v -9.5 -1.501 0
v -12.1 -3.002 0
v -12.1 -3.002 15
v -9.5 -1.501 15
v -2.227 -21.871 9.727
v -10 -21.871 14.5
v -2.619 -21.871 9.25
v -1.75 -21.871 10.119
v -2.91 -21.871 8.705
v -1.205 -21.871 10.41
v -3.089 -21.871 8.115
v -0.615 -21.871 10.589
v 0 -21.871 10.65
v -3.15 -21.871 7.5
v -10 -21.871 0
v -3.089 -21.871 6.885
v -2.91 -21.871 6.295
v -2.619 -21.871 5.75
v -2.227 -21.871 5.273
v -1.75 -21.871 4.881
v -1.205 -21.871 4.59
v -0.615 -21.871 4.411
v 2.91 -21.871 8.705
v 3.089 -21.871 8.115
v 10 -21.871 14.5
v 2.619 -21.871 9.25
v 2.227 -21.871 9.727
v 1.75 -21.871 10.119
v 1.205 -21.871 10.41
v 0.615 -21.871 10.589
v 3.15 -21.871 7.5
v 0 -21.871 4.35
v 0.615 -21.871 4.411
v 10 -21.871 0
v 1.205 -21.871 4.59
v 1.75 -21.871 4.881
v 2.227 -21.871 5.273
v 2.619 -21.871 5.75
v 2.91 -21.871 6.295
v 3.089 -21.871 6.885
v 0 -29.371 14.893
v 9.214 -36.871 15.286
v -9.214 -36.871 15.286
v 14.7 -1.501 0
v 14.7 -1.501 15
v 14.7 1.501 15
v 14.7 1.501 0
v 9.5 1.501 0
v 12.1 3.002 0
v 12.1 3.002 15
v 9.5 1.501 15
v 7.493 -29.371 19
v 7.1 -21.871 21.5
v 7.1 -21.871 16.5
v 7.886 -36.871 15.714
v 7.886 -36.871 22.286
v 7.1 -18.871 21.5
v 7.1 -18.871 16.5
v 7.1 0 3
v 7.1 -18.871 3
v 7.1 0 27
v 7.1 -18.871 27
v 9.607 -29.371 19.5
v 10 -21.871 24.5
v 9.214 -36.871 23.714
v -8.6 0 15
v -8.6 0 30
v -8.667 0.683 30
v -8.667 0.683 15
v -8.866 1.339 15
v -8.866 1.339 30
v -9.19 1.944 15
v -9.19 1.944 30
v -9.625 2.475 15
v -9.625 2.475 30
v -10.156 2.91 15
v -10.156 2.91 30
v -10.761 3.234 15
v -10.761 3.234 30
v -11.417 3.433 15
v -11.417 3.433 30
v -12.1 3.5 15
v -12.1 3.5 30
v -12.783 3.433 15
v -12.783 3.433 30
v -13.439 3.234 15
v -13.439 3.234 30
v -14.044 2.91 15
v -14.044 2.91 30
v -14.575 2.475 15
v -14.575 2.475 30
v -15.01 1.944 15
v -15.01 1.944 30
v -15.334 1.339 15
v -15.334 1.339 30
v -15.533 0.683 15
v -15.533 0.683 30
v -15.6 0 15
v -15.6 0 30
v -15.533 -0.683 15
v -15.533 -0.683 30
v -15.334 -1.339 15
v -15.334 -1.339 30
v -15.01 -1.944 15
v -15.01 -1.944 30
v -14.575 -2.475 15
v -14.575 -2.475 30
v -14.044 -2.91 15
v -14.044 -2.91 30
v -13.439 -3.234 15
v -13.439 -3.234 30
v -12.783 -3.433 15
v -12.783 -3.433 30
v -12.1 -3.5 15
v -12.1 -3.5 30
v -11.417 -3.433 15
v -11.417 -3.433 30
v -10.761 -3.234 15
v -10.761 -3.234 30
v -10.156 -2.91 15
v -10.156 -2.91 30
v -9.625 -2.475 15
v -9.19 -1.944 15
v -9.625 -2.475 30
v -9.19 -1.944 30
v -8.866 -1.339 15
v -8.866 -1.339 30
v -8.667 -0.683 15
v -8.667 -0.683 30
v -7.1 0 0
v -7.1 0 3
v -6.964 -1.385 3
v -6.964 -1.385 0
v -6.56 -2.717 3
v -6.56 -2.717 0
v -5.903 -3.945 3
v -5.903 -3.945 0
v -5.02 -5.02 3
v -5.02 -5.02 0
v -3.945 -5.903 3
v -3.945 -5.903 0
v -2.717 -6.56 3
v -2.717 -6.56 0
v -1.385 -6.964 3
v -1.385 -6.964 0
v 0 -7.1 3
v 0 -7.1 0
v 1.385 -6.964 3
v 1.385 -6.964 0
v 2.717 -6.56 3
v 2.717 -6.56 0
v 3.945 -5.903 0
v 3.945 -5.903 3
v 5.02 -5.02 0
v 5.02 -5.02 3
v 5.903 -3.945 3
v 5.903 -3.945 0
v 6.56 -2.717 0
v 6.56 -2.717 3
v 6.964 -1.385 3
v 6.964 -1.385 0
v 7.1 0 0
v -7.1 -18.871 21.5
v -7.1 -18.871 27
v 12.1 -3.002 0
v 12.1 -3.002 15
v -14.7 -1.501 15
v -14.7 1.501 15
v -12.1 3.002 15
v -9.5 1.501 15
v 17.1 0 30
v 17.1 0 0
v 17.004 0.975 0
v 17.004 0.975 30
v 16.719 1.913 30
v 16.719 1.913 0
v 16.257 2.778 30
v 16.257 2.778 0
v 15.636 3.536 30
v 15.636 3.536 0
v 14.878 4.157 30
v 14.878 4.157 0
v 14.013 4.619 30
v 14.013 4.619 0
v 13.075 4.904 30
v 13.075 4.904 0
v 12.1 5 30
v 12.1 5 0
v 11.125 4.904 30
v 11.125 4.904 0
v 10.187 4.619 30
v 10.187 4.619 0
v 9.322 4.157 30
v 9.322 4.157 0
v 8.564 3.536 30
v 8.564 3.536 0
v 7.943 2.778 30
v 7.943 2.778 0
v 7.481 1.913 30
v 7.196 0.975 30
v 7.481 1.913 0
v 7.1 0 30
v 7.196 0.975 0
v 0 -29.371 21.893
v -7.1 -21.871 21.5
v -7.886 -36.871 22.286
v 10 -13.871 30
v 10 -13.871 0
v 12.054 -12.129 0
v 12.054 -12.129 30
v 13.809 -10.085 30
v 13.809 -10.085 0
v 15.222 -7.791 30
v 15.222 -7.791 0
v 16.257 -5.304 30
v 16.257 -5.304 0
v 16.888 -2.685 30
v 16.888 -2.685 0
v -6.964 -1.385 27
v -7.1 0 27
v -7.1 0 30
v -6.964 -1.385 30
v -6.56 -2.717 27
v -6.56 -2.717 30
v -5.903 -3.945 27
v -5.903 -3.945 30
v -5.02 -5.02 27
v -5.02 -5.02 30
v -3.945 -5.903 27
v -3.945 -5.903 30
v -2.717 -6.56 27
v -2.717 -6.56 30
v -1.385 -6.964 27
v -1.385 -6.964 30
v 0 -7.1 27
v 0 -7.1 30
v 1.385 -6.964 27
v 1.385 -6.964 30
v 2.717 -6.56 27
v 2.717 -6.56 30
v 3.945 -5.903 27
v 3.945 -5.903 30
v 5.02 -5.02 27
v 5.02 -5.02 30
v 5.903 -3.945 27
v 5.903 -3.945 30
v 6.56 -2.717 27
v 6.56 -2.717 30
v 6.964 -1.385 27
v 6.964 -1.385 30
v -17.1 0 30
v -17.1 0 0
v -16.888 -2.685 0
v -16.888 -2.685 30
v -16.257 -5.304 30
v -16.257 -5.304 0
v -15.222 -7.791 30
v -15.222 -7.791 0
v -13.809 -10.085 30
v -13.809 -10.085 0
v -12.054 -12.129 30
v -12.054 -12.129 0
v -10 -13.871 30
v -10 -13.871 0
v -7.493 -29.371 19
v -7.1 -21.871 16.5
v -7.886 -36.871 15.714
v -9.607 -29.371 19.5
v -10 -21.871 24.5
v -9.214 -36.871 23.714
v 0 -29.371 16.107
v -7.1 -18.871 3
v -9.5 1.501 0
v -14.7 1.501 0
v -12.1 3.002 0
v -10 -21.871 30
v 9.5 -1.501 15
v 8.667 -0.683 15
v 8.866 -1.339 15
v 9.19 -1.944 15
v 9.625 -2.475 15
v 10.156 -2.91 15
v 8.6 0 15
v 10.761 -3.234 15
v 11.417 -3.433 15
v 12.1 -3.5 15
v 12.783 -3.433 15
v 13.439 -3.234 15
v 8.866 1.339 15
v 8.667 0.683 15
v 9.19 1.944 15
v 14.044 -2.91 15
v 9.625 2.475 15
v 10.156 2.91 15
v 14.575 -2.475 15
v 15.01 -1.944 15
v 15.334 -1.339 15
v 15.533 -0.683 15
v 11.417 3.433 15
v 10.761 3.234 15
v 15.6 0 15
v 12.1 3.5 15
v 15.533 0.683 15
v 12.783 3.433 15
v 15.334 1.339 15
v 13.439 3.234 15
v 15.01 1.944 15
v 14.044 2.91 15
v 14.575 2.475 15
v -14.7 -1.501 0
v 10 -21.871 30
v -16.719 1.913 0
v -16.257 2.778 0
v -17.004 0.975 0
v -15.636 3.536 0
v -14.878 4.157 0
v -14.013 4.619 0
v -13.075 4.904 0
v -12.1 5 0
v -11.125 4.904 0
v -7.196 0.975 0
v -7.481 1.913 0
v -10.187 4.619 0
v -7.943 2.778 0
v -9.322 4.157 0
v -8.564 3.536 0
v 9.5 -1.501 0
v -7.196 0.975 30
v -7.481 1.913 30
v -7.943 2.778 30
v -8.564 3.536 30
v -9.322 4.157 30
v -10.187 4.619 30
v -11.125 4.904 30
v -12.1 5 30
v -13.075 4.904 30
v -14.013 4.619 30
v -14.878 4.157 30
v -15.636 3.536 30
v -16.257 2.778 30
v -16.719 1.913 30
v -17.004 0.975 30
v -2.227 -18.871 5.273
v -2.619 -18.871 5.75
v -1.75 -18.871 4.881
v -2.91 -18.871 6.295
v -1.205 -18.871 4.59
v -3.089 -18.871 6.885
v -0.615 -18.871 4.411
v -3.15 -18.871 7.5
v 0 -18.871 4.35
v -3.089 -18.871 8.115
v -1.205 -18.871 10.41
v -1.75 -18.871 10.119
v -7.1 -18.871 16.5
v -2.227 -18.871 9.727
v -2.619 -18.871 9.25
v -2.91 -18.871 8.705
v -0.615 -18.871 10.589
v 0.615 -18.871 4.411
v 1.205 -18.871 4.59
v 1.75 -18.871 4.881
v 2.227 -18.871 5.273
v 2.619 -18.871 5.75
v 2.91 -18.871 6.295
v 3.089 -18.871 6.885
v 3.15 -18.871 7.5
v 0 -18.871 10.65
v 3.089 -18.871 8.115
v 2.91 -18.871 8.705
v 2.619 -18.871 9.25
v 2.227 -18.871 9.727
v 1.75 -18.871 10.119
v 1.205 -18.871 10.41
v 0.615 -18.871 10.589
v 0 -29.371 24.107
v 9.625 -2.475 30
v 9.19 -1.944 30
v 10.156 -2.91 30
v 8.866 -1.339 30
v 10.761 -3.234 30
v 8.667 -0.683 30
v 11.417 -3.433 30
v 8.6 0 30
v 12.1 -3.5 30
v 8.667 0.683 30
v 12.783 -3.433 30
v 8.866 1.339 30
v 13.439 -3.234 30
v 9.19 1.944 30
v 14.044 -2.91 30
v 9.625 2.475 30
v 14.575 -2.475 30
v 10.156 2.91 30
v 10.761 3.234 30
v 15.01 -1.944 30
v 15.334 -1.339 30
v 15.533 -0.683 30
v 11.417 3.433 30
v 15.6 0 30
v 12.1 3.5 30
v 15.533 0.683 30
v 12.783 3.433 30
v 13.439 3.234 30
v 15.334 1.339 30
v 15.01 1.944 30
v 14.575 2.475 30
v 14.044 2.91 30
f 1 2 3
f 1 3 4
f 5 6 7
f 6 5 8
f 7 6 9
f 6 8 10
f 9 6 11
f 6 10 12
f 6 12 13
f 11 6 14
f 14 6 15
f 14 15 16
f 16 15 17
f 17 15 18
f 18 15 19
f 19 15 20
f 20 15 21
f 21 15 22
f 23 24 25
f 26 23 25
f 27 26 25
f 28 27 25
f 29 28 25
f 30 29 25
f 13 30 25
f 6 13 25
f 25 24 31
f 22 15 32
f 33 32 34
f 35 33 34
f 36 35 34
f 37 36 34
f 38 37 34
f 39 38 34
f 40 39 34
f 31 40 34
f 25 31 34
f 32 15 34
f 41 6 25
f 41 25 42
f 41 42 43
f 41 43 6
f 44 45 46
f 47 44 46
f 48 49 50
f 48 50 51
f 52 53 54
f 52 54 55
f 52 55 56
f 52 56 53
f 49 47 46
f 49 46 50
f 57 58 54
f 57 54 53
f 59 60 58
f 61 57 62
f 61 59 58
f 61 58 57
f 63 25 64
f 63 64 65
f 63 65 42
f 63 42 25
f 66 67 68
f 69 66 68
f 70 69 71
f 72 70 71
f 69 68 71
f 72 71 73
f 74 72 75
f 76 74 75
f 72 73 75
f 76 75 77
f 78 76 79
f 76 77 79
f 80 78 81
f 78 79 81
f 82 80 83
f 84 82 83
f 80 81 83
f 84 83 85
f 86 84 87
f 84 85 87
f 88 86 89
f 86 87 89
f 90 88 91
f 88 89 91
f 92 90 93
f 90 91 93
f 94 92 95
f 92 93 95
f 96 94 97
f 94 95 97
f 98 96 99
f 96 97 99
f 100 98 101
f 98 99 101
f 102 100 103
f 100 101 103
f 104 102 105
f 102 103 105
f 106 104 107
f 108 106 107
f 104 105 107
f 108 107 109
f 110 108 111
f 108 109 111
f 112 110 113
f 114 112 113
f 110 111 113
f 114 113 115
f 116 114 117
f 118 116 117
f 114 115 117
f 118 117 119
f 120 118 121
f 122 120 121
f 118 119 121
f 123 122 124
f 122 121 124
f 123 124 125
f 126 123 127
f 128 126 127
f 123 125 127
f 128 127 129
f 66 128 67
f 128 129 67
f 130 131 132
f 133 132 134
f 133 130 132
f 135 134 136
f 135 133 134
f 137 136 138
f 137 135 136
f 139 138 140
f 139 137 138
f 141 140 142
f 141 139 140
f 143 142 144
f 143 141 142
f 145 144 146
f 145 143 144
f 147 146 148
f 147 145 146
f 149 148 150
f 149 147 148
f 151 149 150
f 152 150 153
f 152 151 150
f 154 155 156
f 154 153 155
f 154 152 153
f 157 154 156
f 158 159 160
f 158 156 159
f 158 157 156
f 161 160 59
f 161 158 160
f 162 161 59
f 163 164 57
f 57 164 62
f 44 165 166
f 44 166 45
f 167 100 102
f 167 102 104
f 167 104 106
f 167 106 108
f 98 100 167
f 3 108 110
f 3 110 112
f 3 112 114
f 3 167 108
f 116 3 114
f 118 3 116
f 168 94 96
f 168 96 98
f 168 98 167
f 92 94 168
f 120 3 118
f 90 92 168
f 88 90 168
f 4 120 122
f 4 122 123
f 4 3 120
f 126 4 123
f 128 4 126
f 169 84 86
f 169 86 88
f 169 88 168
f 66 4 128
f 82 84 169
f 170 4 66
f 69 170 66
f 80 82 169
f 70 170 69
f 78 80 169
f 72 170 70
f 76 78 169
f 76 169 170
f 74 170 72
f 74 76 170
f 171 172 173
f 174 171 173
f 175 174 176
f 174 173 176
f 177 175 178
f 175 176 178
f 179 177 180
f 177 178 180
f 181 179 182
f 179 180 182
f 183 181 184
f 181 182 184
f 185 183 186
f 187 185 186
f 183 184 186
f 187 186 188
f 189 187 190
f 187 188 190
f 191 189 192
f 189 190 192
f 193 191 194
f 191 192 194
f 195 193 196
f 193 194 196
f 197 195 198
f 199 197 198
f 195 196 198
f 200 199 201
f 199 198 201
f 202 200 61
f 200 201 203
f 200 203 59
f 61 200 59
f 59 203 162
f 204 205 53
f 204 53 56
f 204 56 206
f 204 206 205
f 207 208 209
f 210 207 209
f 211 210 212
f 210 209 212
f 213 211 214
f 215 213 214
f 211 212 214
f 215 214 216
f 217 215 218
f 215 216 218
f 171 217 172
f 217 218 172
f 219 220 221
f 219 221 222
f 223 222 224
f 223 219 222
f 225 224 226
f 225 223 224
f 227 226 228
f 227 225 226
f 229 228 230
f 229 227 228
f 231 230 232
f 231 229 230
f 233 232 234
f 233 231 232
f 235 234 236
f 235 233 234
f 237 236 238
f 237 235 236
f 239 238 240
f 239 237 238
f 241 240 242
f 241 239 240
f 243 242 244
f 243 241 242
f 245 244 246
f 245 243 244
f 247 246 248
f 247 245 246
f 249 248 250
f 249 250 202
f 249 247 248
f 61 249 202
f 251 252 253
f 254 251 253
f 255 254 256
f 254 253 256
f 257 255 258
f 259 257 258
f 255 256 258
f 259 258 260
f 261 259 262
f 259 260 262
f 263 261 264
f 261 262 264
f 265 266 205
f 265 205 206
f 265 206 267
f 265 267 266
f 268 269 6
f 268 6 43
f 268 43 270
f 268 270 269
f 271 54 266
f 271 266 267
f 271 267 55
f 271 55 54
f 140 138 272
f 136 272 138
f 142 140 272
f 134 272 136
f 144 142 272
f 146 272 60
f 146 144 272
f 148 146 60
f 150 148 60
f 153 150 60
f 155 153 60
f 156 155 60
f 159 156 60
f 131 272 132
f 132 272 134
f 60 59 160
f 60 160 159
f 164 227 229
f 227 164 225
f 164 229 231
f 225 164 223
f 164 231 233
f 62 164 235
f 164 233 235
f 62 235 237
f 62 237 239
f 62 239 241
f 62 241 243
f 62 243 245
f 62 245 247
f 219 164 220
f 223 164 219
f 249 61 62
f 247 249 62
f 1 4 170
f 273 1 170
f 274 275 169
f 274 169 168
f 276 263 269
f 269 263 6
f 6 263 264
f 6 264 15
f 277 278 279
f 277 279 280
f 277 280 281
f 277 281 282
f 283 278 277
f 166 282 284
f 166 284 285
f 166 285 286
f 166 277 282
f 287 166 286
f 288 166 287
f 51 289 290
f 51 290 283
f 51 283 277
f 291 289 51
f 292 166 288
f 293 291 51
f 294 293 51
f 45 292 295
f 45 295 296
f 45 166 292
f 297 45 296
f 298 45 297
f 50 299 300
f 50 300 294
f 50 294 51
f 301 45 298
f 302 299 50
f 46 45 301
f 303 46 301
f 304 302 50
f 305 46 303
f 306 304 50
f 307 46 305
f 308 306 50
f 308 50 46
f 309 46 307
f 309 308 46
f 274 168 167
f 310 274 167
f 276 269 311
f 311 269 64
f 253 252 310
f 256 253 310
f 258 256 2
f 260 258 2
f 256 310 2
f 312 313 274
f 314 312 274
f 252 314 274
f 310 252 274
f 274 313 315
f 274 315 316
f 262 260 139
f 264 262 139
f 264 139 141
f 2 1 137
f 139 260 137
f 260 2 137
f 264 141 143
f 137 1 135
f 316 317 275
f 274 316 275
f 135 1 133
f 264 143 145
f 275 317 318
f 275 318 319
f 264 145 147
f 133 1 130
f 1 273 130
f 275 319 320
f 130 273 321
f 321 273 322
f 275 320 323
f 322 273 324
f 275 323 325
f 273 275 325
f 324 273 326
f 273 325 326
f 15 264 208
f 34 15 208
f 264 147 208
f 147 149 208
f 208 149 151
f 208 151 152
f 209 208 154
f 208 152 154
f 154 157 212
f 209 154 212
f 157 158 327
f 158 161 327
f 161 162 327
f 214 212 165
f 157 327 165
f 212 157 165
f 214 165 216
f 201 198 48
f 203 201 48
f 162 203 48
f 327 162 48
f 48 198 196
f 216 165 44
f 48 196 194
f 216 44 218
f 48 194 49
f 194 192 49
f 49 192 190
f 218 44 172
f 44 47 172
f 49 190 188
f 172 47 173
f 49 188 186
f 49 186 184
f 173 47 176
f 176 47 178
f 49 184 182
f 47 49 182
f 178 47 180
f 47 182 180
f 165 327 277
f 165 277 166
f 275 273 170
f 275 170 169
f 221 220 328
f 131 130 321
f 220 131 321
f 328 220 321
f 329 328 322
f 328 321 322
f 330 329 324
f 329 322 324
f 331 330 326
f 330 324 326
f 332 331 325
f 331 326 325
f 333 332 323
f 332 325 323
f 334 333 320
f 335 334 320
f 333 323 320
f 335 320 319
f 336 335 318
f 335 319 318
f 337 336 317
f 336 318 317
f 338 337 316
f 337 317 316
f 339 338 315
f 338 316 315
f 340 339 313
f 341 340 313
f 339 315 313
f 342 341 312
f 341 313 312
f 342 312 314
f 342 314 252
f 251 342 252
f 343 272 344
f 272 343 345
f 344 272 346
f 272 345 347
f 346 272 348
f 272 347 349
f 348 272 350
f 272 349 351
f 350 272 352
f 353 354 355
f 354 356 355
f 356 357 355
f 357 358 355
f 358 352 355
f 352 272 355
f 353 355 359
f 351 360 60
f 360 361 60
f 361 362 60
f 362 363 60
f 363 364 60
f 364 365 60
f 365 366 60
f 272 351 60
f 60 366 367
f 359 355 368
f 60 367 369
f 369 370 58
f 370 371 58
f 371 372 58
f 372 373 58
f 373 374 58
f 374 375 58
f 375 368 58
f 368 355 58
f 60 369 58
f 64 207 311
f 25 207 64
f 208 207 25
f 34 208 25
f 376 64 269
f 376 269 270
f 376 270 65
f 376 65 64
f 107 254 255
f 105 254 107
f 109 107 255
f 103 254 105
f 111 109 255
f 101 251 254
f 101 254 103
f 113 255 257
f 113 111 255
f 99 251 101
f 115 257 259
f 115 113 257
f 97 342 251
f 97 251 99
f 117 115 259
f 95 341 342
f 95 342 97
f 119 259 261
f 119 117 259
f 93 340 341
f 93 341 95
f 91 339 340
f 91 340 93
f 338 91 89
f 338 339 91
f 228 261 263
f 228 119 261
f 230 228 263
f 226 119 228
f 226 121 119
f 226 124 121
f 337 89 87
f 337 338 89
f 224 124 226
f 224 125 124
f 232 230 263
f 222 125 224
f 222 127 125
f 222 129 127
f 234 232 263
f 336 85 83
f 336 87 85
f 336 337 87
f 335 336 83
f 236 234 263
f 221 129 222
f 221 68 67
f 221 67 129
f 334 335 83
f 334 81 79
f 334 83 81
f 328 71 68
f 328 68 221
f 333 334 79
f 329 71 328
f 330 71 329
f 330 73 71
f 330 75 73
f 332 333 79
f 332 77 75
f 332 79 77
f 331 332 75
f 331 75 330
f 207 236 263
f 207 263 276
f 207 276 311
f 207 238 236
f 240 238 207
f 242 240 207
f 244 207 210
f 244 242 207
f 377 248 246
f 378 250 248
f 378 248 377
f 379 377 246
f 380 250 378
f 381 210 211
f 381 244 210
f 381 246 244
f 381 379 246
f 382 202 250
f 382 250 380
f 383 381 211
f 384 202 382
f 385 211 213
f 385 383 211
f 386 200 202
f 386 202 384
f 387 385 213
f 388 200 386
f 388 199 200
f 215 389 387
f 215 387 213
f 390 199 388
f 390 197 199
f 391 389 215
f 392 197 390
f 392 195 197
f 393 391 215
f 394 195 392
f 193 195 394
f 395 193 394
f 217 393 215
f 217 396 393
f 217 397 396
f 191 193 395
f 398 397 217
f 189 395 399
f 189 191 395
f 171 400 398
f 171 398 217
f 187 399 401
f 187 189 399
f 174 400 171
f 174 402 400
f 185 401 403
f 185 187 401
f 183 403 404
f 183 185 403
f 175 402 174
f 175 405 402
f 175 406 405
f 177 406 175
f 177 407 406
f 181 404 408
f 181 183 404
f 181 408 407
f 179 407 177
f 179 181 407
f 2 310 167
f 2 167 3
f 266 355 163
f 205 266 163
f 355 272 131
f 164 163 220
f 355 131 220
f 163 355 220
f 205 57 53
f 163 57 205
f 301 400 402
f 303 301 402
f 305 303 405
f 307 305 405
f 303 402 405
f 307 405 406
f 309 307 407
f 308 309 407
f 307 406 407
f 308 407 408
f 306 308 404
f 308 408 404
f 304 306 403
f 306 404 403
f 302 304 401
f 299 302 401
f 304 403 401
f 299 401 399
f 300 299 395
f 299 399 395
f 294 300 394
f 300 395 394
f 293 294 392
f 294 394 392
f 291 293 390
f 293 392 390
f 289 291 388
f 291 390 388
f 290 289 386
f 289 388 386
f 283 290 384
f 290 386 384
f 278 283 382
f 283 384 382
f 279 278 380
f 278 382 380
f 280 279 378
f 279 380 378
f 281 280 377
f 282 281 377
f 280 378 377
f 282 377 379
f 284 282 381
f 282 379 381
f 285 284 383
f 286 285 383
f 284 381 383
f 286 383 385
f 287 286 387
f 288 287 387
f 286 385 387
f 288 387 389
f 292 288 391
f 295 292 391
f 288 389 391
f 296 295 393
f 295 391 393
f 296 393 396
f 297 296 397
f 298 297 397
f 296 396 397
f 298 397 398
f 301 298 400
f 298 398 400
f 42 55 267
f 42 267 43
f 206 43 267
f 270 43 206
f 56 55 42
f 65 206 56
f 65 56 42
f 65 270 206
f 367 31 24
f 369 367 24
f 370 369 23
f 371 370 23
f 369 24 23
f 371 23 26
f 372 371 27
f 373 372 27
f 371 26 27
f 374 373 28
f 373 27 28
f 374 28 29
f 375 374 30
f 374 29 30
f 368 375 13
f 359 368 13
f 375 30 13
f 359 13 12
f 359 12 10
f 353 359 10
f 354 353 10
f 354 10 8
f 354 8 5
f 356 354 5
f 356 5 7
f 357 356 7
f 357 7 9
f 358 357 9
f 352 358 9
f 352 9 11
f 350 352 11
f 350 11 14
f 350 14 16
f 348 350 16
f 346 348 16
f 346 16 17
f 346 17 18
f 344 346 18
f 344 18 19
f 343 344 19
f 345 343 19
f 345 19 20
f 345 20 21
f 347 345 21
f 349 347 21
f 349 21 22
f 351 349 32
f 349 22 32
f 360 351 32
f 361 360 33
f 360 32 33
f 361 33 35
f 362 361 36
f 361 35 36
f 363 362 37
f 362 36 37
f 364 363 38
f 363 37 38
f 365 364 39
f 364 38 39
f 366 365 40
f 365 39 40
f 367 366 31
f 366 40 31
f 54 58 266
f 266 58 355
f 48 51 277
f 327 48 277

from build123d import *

# Parameters (mm, degrees)
PAD_DEPTH       = 30
SKETCH001_W     = 14.2
SKETCH001_H     = 24
POCKET_DEPTH    = 19
SKETCH002_R     = 3.15
POCKET001_DEPTH = 5
SKETCH003_W     = 14.2
SKETCH003_H     = 5
POCKET002_DEPTH = 5
SKETCH004_W     = 20
SKETCH004_H     = 10
SKETCH004_W_2   = 14.2
SKETCH004_H_2   = 5
PAD001_DEPTH    = 15
PAD001_TAPER    = 3
SKETCH005_R     = 3.5
POCKET003_DEPTH = 15


with BuildPart() as part:
    # Sketch → Pad (new body)
    with BuildSketch(Plane.XY):
        with BuildLine():
            ThreePointArc((-7.1, 0), (-12.1, 5), (-17.1, 0))
            ThreePointArc((-17.1, 0), (-15.221859, -7.791341), (-10, -13.871193))
            Line((-10, -13.871193), (-10, -21.871193))
            Line((-10, -21.871193), (10, -21.871193))
            Line((10, -13.871193), (10, -21.871193))
            ThreePointArc((10, -13.871193), (15.221859, -7.791341), (17.1, 0))
            ThreePointArc((17.1, 0), (12.1, 5), (7.1, 0))
            ThreePointArc((-7.1, 0), (0, -7.1), (7.1, 0))
        make_face()
        Polygon((-9.5, -1.501111), (-9.5, 1.501111), (-12.1, 3.002221), (-14.7, 1.501111), (-14.7, -1.501111), (-12.1, -3.002221), align=None, mode=Mode.SUBTRACT)
        Polygon((14.7, -1.501111), (14.7, 1.501111), (12.1, 3.002221), (9.5, 1.501111), (9.5, -1.501111), (12.1, -3.002221), align=None, mode=Mode.SUBTRACT)
    extrude(amount=PAD_DEPTH)

    # Sketch001 (on DatumPlane) → Pocket (cut)
    with BuildSketch(Plane.XZ.offset(-0.128807)):
        with Locations((0, 15)):
            Rectangle(SKETCH001_W, SKETCH001_H)
    extrude(amount=POCKET_DEPTH, mode=Mode.SUBTRACT)

    # Sketch002 (on Face13 of Pocket) → Pocket001 (cut)
    with BuildSketch(Plane.XZ.offset(21.871193)):
        with Locations((0, 7.5)):
            Circle(SKETCH002_R)
    extrude(amount=-POCKET001_DEPTH, mode=Mode.SUBTRACT)

    # Sketch003 (on Face10 of Pocket001) → Pocket002 (cut)
    with BuildSketch(Plane(origin=(0, -18.871193, 0), x_dir=(-1, 0, 0), z_dir=(0, 1, 0))):
        with Locations((0, 19)):
            Rectangle(SKETCH003_W, SKETCH003_H)
    extrude(amount=-POCKET002_DEPTH, mode=Mode.SUBTRACT)

    # Sketch004 (on Face15 of Pocket002) → Pad001 (join)
    with BuildSketch(Plane.XZ.offset(21.871193)):
        with Locations((0, 19.5)):
            Rectangle(SKETCH004_W, SKETCH004_H)
        with Locations((0, 19)):
            Rectangle(SKETCH004_W_2, SKETCH004_H_2, mode=Mode.SUBTRACT)
    extrude(amount=PAD001_DEPTH, taper=PAD001_TAPER)

    # Sketch005 (on Face7 of Pad001) → Pocket003 (cut)
    with BuildSketch(Plane.XY.offset(30)):
        with Locations((-12.1, 0)):
            Circle(SKETCH005_R)
        with Locations((12.1, 0)):
            Circle(SKETCH005_R)
    extrude(amount=-POCKET003_DEPTH, mode=Mode.SUBTRACT)


solid = part.part
